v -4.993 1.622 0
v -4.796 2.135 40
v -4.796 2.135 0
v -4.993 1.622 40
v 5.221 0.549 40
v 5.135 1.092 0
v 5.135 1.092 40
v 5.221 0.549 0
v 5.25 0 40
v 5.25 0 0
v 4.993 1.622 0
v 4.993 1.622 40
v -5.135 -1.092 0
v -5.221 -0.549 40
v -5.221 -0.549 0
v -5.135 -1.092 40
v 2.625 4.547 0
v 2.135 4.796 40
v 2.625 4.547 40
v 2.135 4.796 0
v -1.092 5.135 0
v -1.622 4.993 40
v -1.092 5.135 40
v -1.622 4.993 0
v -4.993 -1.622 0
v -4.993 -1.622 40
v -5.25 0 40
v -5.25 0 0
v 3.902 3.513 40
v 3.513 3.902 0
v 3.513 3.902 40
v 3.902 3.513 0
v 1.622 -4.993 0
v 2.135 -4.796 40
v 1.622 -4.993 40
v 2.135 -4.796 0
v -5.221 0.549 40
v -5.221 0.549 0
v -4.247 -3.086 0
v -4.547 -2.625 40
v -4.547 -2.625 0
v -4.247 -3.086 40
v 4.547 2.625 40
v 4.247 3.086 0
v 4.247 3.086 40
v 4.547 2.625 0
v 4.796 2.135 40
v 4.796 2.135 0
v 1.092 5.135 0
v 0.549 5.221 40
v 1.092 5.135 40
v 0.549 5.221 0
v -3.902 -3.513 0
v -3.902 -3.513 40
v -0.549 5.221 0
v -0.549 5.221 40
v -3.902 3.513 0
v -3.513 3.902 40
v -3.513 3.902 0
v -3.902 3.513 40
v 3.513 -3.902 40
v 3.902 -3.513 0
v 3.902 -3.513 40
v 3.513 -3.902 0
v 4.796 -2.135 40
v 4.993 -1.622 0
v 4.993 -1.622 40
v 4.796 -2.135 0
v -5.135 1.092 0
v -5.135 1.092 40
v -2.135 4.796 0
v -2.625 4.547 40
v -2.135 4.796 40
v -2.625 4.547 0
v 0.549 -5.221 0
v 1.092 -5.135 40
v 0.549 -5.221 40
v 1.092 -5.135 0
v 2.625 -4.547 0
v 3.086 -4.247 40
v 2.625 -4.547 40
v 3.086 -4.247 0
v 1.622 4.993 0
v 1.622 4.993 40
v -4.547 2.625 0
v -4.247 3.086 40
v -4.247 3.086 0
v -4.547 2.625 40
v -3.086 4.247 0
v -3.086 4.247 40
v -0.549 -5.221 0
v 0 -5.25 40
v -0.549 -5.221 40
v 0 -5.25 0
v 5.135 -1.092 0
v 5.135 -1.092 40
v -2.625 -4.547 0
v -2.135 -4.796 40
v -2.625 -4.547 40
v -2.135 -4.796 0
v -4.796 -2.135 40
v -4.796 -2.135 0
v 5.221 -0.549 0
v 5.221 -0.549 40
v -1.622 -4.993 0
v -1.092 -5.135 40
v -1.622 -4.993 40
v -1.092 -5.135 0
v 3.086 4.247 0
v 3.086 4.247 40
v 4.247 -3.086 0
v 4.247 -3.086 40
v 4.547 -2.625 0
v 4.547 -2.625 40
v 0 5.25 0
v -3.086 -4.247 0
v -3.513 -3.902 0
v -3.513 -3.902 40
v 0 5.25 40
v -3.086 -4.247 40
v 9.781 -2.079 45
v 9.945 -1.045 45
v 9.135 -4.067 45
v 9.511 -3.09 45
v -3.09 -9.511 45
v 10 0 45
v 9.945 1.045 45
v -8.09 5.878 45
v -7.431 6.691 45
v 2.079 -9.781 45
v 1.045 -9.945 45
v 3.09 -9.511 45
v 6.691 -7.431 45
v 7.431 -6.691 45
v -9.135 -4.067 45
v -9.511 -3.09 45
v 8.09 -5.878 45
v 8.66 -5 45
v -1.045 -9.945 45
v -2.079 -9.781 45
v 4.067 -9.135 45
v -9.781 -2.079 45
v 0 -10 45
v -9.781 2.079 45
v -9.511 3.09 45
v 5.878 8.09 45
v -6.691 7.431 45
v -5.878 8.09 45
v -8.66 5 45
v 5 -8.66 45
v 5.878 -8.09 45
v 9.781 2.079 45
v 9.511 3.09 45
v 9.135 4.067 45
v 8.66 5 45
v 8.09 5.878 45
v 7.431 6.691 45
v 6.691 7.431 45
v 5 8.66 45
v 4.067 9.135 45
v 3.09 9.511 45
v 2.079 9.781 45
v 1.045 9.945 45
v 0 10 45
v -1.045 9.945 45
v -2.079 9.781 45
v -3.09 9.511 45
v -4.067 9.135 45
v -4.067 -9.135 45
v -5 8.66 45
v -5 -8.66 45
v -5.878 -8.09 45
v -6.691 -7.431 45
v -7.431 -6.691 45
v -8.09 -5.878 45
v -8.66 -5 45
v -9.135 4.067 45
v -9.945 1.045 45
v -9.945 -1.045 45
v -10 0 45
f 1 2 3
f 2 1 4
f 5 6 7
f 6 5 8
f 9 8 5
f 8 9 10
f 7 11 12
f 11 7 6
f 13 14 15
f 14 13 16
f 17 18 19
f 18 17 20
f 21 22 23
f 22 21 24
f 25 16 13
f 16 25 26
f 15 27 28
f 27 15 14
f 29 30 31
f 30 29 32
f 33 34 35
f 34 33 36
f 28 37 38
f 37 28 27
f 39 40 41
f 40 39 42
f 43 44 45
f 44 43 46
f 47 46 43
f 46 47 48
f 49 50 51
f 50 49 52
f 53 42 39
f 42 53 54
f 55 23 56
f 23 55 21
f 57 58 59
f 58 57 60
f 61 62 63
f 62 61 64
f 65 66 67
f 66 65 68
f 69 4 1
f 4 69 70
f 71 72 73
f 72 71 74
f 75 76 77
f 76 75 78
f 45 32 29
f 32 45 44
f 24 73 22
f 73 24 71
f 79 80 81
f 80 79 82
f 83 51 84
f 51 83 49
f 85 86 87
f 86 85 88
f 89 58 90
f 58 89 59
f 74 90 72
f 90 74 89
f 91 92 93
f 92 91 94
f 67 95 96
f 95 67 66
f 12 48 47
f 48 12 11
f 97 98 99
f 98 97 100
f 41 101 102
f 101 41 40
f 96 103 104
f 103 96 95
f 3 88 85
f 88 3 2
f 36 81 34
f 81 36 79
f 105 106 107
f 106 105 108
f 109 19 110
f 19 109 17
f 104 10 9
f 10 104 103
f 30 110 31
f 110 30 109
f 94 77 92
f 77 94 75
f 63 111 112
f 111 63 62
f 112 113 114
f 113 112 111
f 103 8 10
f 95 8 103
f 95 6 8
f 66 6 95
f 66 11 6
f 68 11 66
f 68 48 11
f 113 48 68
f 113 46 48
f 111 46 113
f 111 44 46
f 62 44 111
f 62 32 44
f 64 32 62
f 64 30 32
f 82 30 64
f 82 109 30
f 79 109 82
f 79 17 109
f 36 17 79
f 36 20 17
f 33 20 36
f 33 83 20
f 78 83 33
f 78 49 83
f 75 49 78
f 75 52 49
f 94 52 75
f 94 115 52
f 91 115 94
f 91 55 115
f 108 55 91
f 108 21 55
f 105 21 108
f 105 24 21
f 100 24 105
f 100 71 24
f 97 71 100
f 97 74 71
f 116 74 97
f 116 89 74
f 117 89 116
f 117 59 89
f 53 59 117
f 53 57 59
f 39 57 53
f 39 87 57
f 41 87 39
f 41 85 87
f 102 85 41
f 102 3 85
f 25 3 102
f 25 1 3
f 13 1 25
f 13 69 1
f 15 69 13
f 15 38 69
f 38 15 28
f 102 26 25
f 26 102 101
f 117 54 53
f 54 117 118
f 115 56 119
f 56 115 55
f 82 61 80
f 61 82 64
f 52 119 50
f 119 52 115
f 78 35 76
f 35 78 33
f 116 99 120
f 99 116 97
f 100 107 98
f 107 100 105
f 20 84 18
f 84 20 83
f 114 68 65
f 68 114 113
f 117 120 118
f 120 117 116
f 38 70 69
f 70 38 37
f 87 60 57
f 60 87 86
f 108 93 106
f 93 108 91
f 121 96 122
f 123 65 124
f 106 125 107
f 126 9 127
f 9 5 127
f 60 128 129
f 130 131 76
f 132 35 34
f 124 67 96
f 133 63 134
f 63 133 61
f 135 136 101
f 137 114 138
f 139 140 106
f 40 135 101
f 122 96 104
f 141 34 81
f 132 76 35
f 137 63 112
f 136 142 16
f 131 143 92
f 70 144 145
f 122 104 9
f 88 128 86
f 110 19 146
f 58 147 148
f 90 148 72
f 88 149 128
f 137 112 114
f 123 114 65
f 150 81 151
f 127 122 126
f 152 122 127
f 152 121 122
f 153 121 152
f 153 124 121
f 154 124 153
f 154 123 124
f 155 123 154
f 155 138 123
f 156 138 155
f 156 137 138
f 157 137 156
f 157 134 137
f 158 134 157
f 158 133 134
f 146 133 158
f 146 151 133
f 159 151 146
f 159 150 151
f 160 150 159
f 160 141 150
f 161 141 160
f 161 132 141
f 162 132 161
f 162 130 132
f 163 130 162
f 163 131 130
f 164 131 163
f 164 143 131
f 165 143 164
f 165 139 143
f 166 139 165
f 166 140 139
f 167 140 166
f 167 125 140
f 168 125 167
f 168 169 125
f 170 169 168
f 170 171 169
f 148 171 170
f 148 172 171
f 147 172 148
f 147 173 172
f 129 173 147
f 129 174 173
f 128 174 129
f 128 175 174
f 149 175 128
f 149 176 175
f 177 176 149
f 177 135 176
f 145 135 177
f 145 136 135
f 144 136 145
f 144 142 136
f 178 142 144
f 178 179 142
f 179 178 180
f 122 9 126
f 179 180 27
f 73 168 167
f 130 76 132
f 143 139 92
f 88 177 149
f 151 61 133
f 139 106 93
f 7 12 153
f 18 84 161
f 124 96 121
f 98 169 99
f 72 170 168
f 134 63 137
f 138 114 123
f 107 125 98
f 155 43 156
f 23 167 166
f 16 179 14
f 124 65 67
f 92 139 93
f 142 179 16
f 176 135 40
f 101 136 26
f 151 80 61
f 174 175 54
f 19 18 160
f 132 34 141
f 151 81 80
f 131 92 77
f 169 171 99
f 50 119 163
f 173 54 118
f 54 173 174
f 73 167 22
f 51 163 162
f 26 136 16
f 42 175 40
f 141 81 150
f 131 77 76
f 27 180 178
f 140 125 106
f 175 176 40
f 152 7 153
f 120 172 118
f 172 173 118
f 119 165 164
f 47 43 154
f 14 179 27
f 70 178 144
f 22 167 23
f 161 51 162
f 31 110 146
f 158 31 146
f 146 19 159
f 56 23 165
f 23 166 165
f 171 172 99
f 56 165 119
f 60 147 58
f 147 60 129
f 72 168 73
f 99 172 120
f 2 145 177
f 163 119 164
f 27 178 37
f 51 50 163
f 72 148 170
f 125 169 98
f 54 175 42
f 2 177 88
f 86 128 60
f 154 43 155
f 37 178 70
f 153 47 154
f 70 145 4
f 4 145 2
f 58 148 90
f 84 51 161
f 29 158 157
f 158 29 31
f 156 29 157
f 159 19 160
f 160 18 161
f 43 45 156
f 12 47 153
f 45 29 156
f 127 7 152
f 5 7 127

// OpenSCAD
// Countersunk screw with 90-degree conical head.
$fn = 60;
eps = 0.02;
shaft_d = 10.5;
head_d = 20;
head_h = 5;
shaft_l = 40;
union() {
    cylinder(d = shaft_d, h = shaft_l);
    translate([0, 0, shaft_l]) cylinder(d1 = shaft_d, d2 = head_d, h = head_h);
}
